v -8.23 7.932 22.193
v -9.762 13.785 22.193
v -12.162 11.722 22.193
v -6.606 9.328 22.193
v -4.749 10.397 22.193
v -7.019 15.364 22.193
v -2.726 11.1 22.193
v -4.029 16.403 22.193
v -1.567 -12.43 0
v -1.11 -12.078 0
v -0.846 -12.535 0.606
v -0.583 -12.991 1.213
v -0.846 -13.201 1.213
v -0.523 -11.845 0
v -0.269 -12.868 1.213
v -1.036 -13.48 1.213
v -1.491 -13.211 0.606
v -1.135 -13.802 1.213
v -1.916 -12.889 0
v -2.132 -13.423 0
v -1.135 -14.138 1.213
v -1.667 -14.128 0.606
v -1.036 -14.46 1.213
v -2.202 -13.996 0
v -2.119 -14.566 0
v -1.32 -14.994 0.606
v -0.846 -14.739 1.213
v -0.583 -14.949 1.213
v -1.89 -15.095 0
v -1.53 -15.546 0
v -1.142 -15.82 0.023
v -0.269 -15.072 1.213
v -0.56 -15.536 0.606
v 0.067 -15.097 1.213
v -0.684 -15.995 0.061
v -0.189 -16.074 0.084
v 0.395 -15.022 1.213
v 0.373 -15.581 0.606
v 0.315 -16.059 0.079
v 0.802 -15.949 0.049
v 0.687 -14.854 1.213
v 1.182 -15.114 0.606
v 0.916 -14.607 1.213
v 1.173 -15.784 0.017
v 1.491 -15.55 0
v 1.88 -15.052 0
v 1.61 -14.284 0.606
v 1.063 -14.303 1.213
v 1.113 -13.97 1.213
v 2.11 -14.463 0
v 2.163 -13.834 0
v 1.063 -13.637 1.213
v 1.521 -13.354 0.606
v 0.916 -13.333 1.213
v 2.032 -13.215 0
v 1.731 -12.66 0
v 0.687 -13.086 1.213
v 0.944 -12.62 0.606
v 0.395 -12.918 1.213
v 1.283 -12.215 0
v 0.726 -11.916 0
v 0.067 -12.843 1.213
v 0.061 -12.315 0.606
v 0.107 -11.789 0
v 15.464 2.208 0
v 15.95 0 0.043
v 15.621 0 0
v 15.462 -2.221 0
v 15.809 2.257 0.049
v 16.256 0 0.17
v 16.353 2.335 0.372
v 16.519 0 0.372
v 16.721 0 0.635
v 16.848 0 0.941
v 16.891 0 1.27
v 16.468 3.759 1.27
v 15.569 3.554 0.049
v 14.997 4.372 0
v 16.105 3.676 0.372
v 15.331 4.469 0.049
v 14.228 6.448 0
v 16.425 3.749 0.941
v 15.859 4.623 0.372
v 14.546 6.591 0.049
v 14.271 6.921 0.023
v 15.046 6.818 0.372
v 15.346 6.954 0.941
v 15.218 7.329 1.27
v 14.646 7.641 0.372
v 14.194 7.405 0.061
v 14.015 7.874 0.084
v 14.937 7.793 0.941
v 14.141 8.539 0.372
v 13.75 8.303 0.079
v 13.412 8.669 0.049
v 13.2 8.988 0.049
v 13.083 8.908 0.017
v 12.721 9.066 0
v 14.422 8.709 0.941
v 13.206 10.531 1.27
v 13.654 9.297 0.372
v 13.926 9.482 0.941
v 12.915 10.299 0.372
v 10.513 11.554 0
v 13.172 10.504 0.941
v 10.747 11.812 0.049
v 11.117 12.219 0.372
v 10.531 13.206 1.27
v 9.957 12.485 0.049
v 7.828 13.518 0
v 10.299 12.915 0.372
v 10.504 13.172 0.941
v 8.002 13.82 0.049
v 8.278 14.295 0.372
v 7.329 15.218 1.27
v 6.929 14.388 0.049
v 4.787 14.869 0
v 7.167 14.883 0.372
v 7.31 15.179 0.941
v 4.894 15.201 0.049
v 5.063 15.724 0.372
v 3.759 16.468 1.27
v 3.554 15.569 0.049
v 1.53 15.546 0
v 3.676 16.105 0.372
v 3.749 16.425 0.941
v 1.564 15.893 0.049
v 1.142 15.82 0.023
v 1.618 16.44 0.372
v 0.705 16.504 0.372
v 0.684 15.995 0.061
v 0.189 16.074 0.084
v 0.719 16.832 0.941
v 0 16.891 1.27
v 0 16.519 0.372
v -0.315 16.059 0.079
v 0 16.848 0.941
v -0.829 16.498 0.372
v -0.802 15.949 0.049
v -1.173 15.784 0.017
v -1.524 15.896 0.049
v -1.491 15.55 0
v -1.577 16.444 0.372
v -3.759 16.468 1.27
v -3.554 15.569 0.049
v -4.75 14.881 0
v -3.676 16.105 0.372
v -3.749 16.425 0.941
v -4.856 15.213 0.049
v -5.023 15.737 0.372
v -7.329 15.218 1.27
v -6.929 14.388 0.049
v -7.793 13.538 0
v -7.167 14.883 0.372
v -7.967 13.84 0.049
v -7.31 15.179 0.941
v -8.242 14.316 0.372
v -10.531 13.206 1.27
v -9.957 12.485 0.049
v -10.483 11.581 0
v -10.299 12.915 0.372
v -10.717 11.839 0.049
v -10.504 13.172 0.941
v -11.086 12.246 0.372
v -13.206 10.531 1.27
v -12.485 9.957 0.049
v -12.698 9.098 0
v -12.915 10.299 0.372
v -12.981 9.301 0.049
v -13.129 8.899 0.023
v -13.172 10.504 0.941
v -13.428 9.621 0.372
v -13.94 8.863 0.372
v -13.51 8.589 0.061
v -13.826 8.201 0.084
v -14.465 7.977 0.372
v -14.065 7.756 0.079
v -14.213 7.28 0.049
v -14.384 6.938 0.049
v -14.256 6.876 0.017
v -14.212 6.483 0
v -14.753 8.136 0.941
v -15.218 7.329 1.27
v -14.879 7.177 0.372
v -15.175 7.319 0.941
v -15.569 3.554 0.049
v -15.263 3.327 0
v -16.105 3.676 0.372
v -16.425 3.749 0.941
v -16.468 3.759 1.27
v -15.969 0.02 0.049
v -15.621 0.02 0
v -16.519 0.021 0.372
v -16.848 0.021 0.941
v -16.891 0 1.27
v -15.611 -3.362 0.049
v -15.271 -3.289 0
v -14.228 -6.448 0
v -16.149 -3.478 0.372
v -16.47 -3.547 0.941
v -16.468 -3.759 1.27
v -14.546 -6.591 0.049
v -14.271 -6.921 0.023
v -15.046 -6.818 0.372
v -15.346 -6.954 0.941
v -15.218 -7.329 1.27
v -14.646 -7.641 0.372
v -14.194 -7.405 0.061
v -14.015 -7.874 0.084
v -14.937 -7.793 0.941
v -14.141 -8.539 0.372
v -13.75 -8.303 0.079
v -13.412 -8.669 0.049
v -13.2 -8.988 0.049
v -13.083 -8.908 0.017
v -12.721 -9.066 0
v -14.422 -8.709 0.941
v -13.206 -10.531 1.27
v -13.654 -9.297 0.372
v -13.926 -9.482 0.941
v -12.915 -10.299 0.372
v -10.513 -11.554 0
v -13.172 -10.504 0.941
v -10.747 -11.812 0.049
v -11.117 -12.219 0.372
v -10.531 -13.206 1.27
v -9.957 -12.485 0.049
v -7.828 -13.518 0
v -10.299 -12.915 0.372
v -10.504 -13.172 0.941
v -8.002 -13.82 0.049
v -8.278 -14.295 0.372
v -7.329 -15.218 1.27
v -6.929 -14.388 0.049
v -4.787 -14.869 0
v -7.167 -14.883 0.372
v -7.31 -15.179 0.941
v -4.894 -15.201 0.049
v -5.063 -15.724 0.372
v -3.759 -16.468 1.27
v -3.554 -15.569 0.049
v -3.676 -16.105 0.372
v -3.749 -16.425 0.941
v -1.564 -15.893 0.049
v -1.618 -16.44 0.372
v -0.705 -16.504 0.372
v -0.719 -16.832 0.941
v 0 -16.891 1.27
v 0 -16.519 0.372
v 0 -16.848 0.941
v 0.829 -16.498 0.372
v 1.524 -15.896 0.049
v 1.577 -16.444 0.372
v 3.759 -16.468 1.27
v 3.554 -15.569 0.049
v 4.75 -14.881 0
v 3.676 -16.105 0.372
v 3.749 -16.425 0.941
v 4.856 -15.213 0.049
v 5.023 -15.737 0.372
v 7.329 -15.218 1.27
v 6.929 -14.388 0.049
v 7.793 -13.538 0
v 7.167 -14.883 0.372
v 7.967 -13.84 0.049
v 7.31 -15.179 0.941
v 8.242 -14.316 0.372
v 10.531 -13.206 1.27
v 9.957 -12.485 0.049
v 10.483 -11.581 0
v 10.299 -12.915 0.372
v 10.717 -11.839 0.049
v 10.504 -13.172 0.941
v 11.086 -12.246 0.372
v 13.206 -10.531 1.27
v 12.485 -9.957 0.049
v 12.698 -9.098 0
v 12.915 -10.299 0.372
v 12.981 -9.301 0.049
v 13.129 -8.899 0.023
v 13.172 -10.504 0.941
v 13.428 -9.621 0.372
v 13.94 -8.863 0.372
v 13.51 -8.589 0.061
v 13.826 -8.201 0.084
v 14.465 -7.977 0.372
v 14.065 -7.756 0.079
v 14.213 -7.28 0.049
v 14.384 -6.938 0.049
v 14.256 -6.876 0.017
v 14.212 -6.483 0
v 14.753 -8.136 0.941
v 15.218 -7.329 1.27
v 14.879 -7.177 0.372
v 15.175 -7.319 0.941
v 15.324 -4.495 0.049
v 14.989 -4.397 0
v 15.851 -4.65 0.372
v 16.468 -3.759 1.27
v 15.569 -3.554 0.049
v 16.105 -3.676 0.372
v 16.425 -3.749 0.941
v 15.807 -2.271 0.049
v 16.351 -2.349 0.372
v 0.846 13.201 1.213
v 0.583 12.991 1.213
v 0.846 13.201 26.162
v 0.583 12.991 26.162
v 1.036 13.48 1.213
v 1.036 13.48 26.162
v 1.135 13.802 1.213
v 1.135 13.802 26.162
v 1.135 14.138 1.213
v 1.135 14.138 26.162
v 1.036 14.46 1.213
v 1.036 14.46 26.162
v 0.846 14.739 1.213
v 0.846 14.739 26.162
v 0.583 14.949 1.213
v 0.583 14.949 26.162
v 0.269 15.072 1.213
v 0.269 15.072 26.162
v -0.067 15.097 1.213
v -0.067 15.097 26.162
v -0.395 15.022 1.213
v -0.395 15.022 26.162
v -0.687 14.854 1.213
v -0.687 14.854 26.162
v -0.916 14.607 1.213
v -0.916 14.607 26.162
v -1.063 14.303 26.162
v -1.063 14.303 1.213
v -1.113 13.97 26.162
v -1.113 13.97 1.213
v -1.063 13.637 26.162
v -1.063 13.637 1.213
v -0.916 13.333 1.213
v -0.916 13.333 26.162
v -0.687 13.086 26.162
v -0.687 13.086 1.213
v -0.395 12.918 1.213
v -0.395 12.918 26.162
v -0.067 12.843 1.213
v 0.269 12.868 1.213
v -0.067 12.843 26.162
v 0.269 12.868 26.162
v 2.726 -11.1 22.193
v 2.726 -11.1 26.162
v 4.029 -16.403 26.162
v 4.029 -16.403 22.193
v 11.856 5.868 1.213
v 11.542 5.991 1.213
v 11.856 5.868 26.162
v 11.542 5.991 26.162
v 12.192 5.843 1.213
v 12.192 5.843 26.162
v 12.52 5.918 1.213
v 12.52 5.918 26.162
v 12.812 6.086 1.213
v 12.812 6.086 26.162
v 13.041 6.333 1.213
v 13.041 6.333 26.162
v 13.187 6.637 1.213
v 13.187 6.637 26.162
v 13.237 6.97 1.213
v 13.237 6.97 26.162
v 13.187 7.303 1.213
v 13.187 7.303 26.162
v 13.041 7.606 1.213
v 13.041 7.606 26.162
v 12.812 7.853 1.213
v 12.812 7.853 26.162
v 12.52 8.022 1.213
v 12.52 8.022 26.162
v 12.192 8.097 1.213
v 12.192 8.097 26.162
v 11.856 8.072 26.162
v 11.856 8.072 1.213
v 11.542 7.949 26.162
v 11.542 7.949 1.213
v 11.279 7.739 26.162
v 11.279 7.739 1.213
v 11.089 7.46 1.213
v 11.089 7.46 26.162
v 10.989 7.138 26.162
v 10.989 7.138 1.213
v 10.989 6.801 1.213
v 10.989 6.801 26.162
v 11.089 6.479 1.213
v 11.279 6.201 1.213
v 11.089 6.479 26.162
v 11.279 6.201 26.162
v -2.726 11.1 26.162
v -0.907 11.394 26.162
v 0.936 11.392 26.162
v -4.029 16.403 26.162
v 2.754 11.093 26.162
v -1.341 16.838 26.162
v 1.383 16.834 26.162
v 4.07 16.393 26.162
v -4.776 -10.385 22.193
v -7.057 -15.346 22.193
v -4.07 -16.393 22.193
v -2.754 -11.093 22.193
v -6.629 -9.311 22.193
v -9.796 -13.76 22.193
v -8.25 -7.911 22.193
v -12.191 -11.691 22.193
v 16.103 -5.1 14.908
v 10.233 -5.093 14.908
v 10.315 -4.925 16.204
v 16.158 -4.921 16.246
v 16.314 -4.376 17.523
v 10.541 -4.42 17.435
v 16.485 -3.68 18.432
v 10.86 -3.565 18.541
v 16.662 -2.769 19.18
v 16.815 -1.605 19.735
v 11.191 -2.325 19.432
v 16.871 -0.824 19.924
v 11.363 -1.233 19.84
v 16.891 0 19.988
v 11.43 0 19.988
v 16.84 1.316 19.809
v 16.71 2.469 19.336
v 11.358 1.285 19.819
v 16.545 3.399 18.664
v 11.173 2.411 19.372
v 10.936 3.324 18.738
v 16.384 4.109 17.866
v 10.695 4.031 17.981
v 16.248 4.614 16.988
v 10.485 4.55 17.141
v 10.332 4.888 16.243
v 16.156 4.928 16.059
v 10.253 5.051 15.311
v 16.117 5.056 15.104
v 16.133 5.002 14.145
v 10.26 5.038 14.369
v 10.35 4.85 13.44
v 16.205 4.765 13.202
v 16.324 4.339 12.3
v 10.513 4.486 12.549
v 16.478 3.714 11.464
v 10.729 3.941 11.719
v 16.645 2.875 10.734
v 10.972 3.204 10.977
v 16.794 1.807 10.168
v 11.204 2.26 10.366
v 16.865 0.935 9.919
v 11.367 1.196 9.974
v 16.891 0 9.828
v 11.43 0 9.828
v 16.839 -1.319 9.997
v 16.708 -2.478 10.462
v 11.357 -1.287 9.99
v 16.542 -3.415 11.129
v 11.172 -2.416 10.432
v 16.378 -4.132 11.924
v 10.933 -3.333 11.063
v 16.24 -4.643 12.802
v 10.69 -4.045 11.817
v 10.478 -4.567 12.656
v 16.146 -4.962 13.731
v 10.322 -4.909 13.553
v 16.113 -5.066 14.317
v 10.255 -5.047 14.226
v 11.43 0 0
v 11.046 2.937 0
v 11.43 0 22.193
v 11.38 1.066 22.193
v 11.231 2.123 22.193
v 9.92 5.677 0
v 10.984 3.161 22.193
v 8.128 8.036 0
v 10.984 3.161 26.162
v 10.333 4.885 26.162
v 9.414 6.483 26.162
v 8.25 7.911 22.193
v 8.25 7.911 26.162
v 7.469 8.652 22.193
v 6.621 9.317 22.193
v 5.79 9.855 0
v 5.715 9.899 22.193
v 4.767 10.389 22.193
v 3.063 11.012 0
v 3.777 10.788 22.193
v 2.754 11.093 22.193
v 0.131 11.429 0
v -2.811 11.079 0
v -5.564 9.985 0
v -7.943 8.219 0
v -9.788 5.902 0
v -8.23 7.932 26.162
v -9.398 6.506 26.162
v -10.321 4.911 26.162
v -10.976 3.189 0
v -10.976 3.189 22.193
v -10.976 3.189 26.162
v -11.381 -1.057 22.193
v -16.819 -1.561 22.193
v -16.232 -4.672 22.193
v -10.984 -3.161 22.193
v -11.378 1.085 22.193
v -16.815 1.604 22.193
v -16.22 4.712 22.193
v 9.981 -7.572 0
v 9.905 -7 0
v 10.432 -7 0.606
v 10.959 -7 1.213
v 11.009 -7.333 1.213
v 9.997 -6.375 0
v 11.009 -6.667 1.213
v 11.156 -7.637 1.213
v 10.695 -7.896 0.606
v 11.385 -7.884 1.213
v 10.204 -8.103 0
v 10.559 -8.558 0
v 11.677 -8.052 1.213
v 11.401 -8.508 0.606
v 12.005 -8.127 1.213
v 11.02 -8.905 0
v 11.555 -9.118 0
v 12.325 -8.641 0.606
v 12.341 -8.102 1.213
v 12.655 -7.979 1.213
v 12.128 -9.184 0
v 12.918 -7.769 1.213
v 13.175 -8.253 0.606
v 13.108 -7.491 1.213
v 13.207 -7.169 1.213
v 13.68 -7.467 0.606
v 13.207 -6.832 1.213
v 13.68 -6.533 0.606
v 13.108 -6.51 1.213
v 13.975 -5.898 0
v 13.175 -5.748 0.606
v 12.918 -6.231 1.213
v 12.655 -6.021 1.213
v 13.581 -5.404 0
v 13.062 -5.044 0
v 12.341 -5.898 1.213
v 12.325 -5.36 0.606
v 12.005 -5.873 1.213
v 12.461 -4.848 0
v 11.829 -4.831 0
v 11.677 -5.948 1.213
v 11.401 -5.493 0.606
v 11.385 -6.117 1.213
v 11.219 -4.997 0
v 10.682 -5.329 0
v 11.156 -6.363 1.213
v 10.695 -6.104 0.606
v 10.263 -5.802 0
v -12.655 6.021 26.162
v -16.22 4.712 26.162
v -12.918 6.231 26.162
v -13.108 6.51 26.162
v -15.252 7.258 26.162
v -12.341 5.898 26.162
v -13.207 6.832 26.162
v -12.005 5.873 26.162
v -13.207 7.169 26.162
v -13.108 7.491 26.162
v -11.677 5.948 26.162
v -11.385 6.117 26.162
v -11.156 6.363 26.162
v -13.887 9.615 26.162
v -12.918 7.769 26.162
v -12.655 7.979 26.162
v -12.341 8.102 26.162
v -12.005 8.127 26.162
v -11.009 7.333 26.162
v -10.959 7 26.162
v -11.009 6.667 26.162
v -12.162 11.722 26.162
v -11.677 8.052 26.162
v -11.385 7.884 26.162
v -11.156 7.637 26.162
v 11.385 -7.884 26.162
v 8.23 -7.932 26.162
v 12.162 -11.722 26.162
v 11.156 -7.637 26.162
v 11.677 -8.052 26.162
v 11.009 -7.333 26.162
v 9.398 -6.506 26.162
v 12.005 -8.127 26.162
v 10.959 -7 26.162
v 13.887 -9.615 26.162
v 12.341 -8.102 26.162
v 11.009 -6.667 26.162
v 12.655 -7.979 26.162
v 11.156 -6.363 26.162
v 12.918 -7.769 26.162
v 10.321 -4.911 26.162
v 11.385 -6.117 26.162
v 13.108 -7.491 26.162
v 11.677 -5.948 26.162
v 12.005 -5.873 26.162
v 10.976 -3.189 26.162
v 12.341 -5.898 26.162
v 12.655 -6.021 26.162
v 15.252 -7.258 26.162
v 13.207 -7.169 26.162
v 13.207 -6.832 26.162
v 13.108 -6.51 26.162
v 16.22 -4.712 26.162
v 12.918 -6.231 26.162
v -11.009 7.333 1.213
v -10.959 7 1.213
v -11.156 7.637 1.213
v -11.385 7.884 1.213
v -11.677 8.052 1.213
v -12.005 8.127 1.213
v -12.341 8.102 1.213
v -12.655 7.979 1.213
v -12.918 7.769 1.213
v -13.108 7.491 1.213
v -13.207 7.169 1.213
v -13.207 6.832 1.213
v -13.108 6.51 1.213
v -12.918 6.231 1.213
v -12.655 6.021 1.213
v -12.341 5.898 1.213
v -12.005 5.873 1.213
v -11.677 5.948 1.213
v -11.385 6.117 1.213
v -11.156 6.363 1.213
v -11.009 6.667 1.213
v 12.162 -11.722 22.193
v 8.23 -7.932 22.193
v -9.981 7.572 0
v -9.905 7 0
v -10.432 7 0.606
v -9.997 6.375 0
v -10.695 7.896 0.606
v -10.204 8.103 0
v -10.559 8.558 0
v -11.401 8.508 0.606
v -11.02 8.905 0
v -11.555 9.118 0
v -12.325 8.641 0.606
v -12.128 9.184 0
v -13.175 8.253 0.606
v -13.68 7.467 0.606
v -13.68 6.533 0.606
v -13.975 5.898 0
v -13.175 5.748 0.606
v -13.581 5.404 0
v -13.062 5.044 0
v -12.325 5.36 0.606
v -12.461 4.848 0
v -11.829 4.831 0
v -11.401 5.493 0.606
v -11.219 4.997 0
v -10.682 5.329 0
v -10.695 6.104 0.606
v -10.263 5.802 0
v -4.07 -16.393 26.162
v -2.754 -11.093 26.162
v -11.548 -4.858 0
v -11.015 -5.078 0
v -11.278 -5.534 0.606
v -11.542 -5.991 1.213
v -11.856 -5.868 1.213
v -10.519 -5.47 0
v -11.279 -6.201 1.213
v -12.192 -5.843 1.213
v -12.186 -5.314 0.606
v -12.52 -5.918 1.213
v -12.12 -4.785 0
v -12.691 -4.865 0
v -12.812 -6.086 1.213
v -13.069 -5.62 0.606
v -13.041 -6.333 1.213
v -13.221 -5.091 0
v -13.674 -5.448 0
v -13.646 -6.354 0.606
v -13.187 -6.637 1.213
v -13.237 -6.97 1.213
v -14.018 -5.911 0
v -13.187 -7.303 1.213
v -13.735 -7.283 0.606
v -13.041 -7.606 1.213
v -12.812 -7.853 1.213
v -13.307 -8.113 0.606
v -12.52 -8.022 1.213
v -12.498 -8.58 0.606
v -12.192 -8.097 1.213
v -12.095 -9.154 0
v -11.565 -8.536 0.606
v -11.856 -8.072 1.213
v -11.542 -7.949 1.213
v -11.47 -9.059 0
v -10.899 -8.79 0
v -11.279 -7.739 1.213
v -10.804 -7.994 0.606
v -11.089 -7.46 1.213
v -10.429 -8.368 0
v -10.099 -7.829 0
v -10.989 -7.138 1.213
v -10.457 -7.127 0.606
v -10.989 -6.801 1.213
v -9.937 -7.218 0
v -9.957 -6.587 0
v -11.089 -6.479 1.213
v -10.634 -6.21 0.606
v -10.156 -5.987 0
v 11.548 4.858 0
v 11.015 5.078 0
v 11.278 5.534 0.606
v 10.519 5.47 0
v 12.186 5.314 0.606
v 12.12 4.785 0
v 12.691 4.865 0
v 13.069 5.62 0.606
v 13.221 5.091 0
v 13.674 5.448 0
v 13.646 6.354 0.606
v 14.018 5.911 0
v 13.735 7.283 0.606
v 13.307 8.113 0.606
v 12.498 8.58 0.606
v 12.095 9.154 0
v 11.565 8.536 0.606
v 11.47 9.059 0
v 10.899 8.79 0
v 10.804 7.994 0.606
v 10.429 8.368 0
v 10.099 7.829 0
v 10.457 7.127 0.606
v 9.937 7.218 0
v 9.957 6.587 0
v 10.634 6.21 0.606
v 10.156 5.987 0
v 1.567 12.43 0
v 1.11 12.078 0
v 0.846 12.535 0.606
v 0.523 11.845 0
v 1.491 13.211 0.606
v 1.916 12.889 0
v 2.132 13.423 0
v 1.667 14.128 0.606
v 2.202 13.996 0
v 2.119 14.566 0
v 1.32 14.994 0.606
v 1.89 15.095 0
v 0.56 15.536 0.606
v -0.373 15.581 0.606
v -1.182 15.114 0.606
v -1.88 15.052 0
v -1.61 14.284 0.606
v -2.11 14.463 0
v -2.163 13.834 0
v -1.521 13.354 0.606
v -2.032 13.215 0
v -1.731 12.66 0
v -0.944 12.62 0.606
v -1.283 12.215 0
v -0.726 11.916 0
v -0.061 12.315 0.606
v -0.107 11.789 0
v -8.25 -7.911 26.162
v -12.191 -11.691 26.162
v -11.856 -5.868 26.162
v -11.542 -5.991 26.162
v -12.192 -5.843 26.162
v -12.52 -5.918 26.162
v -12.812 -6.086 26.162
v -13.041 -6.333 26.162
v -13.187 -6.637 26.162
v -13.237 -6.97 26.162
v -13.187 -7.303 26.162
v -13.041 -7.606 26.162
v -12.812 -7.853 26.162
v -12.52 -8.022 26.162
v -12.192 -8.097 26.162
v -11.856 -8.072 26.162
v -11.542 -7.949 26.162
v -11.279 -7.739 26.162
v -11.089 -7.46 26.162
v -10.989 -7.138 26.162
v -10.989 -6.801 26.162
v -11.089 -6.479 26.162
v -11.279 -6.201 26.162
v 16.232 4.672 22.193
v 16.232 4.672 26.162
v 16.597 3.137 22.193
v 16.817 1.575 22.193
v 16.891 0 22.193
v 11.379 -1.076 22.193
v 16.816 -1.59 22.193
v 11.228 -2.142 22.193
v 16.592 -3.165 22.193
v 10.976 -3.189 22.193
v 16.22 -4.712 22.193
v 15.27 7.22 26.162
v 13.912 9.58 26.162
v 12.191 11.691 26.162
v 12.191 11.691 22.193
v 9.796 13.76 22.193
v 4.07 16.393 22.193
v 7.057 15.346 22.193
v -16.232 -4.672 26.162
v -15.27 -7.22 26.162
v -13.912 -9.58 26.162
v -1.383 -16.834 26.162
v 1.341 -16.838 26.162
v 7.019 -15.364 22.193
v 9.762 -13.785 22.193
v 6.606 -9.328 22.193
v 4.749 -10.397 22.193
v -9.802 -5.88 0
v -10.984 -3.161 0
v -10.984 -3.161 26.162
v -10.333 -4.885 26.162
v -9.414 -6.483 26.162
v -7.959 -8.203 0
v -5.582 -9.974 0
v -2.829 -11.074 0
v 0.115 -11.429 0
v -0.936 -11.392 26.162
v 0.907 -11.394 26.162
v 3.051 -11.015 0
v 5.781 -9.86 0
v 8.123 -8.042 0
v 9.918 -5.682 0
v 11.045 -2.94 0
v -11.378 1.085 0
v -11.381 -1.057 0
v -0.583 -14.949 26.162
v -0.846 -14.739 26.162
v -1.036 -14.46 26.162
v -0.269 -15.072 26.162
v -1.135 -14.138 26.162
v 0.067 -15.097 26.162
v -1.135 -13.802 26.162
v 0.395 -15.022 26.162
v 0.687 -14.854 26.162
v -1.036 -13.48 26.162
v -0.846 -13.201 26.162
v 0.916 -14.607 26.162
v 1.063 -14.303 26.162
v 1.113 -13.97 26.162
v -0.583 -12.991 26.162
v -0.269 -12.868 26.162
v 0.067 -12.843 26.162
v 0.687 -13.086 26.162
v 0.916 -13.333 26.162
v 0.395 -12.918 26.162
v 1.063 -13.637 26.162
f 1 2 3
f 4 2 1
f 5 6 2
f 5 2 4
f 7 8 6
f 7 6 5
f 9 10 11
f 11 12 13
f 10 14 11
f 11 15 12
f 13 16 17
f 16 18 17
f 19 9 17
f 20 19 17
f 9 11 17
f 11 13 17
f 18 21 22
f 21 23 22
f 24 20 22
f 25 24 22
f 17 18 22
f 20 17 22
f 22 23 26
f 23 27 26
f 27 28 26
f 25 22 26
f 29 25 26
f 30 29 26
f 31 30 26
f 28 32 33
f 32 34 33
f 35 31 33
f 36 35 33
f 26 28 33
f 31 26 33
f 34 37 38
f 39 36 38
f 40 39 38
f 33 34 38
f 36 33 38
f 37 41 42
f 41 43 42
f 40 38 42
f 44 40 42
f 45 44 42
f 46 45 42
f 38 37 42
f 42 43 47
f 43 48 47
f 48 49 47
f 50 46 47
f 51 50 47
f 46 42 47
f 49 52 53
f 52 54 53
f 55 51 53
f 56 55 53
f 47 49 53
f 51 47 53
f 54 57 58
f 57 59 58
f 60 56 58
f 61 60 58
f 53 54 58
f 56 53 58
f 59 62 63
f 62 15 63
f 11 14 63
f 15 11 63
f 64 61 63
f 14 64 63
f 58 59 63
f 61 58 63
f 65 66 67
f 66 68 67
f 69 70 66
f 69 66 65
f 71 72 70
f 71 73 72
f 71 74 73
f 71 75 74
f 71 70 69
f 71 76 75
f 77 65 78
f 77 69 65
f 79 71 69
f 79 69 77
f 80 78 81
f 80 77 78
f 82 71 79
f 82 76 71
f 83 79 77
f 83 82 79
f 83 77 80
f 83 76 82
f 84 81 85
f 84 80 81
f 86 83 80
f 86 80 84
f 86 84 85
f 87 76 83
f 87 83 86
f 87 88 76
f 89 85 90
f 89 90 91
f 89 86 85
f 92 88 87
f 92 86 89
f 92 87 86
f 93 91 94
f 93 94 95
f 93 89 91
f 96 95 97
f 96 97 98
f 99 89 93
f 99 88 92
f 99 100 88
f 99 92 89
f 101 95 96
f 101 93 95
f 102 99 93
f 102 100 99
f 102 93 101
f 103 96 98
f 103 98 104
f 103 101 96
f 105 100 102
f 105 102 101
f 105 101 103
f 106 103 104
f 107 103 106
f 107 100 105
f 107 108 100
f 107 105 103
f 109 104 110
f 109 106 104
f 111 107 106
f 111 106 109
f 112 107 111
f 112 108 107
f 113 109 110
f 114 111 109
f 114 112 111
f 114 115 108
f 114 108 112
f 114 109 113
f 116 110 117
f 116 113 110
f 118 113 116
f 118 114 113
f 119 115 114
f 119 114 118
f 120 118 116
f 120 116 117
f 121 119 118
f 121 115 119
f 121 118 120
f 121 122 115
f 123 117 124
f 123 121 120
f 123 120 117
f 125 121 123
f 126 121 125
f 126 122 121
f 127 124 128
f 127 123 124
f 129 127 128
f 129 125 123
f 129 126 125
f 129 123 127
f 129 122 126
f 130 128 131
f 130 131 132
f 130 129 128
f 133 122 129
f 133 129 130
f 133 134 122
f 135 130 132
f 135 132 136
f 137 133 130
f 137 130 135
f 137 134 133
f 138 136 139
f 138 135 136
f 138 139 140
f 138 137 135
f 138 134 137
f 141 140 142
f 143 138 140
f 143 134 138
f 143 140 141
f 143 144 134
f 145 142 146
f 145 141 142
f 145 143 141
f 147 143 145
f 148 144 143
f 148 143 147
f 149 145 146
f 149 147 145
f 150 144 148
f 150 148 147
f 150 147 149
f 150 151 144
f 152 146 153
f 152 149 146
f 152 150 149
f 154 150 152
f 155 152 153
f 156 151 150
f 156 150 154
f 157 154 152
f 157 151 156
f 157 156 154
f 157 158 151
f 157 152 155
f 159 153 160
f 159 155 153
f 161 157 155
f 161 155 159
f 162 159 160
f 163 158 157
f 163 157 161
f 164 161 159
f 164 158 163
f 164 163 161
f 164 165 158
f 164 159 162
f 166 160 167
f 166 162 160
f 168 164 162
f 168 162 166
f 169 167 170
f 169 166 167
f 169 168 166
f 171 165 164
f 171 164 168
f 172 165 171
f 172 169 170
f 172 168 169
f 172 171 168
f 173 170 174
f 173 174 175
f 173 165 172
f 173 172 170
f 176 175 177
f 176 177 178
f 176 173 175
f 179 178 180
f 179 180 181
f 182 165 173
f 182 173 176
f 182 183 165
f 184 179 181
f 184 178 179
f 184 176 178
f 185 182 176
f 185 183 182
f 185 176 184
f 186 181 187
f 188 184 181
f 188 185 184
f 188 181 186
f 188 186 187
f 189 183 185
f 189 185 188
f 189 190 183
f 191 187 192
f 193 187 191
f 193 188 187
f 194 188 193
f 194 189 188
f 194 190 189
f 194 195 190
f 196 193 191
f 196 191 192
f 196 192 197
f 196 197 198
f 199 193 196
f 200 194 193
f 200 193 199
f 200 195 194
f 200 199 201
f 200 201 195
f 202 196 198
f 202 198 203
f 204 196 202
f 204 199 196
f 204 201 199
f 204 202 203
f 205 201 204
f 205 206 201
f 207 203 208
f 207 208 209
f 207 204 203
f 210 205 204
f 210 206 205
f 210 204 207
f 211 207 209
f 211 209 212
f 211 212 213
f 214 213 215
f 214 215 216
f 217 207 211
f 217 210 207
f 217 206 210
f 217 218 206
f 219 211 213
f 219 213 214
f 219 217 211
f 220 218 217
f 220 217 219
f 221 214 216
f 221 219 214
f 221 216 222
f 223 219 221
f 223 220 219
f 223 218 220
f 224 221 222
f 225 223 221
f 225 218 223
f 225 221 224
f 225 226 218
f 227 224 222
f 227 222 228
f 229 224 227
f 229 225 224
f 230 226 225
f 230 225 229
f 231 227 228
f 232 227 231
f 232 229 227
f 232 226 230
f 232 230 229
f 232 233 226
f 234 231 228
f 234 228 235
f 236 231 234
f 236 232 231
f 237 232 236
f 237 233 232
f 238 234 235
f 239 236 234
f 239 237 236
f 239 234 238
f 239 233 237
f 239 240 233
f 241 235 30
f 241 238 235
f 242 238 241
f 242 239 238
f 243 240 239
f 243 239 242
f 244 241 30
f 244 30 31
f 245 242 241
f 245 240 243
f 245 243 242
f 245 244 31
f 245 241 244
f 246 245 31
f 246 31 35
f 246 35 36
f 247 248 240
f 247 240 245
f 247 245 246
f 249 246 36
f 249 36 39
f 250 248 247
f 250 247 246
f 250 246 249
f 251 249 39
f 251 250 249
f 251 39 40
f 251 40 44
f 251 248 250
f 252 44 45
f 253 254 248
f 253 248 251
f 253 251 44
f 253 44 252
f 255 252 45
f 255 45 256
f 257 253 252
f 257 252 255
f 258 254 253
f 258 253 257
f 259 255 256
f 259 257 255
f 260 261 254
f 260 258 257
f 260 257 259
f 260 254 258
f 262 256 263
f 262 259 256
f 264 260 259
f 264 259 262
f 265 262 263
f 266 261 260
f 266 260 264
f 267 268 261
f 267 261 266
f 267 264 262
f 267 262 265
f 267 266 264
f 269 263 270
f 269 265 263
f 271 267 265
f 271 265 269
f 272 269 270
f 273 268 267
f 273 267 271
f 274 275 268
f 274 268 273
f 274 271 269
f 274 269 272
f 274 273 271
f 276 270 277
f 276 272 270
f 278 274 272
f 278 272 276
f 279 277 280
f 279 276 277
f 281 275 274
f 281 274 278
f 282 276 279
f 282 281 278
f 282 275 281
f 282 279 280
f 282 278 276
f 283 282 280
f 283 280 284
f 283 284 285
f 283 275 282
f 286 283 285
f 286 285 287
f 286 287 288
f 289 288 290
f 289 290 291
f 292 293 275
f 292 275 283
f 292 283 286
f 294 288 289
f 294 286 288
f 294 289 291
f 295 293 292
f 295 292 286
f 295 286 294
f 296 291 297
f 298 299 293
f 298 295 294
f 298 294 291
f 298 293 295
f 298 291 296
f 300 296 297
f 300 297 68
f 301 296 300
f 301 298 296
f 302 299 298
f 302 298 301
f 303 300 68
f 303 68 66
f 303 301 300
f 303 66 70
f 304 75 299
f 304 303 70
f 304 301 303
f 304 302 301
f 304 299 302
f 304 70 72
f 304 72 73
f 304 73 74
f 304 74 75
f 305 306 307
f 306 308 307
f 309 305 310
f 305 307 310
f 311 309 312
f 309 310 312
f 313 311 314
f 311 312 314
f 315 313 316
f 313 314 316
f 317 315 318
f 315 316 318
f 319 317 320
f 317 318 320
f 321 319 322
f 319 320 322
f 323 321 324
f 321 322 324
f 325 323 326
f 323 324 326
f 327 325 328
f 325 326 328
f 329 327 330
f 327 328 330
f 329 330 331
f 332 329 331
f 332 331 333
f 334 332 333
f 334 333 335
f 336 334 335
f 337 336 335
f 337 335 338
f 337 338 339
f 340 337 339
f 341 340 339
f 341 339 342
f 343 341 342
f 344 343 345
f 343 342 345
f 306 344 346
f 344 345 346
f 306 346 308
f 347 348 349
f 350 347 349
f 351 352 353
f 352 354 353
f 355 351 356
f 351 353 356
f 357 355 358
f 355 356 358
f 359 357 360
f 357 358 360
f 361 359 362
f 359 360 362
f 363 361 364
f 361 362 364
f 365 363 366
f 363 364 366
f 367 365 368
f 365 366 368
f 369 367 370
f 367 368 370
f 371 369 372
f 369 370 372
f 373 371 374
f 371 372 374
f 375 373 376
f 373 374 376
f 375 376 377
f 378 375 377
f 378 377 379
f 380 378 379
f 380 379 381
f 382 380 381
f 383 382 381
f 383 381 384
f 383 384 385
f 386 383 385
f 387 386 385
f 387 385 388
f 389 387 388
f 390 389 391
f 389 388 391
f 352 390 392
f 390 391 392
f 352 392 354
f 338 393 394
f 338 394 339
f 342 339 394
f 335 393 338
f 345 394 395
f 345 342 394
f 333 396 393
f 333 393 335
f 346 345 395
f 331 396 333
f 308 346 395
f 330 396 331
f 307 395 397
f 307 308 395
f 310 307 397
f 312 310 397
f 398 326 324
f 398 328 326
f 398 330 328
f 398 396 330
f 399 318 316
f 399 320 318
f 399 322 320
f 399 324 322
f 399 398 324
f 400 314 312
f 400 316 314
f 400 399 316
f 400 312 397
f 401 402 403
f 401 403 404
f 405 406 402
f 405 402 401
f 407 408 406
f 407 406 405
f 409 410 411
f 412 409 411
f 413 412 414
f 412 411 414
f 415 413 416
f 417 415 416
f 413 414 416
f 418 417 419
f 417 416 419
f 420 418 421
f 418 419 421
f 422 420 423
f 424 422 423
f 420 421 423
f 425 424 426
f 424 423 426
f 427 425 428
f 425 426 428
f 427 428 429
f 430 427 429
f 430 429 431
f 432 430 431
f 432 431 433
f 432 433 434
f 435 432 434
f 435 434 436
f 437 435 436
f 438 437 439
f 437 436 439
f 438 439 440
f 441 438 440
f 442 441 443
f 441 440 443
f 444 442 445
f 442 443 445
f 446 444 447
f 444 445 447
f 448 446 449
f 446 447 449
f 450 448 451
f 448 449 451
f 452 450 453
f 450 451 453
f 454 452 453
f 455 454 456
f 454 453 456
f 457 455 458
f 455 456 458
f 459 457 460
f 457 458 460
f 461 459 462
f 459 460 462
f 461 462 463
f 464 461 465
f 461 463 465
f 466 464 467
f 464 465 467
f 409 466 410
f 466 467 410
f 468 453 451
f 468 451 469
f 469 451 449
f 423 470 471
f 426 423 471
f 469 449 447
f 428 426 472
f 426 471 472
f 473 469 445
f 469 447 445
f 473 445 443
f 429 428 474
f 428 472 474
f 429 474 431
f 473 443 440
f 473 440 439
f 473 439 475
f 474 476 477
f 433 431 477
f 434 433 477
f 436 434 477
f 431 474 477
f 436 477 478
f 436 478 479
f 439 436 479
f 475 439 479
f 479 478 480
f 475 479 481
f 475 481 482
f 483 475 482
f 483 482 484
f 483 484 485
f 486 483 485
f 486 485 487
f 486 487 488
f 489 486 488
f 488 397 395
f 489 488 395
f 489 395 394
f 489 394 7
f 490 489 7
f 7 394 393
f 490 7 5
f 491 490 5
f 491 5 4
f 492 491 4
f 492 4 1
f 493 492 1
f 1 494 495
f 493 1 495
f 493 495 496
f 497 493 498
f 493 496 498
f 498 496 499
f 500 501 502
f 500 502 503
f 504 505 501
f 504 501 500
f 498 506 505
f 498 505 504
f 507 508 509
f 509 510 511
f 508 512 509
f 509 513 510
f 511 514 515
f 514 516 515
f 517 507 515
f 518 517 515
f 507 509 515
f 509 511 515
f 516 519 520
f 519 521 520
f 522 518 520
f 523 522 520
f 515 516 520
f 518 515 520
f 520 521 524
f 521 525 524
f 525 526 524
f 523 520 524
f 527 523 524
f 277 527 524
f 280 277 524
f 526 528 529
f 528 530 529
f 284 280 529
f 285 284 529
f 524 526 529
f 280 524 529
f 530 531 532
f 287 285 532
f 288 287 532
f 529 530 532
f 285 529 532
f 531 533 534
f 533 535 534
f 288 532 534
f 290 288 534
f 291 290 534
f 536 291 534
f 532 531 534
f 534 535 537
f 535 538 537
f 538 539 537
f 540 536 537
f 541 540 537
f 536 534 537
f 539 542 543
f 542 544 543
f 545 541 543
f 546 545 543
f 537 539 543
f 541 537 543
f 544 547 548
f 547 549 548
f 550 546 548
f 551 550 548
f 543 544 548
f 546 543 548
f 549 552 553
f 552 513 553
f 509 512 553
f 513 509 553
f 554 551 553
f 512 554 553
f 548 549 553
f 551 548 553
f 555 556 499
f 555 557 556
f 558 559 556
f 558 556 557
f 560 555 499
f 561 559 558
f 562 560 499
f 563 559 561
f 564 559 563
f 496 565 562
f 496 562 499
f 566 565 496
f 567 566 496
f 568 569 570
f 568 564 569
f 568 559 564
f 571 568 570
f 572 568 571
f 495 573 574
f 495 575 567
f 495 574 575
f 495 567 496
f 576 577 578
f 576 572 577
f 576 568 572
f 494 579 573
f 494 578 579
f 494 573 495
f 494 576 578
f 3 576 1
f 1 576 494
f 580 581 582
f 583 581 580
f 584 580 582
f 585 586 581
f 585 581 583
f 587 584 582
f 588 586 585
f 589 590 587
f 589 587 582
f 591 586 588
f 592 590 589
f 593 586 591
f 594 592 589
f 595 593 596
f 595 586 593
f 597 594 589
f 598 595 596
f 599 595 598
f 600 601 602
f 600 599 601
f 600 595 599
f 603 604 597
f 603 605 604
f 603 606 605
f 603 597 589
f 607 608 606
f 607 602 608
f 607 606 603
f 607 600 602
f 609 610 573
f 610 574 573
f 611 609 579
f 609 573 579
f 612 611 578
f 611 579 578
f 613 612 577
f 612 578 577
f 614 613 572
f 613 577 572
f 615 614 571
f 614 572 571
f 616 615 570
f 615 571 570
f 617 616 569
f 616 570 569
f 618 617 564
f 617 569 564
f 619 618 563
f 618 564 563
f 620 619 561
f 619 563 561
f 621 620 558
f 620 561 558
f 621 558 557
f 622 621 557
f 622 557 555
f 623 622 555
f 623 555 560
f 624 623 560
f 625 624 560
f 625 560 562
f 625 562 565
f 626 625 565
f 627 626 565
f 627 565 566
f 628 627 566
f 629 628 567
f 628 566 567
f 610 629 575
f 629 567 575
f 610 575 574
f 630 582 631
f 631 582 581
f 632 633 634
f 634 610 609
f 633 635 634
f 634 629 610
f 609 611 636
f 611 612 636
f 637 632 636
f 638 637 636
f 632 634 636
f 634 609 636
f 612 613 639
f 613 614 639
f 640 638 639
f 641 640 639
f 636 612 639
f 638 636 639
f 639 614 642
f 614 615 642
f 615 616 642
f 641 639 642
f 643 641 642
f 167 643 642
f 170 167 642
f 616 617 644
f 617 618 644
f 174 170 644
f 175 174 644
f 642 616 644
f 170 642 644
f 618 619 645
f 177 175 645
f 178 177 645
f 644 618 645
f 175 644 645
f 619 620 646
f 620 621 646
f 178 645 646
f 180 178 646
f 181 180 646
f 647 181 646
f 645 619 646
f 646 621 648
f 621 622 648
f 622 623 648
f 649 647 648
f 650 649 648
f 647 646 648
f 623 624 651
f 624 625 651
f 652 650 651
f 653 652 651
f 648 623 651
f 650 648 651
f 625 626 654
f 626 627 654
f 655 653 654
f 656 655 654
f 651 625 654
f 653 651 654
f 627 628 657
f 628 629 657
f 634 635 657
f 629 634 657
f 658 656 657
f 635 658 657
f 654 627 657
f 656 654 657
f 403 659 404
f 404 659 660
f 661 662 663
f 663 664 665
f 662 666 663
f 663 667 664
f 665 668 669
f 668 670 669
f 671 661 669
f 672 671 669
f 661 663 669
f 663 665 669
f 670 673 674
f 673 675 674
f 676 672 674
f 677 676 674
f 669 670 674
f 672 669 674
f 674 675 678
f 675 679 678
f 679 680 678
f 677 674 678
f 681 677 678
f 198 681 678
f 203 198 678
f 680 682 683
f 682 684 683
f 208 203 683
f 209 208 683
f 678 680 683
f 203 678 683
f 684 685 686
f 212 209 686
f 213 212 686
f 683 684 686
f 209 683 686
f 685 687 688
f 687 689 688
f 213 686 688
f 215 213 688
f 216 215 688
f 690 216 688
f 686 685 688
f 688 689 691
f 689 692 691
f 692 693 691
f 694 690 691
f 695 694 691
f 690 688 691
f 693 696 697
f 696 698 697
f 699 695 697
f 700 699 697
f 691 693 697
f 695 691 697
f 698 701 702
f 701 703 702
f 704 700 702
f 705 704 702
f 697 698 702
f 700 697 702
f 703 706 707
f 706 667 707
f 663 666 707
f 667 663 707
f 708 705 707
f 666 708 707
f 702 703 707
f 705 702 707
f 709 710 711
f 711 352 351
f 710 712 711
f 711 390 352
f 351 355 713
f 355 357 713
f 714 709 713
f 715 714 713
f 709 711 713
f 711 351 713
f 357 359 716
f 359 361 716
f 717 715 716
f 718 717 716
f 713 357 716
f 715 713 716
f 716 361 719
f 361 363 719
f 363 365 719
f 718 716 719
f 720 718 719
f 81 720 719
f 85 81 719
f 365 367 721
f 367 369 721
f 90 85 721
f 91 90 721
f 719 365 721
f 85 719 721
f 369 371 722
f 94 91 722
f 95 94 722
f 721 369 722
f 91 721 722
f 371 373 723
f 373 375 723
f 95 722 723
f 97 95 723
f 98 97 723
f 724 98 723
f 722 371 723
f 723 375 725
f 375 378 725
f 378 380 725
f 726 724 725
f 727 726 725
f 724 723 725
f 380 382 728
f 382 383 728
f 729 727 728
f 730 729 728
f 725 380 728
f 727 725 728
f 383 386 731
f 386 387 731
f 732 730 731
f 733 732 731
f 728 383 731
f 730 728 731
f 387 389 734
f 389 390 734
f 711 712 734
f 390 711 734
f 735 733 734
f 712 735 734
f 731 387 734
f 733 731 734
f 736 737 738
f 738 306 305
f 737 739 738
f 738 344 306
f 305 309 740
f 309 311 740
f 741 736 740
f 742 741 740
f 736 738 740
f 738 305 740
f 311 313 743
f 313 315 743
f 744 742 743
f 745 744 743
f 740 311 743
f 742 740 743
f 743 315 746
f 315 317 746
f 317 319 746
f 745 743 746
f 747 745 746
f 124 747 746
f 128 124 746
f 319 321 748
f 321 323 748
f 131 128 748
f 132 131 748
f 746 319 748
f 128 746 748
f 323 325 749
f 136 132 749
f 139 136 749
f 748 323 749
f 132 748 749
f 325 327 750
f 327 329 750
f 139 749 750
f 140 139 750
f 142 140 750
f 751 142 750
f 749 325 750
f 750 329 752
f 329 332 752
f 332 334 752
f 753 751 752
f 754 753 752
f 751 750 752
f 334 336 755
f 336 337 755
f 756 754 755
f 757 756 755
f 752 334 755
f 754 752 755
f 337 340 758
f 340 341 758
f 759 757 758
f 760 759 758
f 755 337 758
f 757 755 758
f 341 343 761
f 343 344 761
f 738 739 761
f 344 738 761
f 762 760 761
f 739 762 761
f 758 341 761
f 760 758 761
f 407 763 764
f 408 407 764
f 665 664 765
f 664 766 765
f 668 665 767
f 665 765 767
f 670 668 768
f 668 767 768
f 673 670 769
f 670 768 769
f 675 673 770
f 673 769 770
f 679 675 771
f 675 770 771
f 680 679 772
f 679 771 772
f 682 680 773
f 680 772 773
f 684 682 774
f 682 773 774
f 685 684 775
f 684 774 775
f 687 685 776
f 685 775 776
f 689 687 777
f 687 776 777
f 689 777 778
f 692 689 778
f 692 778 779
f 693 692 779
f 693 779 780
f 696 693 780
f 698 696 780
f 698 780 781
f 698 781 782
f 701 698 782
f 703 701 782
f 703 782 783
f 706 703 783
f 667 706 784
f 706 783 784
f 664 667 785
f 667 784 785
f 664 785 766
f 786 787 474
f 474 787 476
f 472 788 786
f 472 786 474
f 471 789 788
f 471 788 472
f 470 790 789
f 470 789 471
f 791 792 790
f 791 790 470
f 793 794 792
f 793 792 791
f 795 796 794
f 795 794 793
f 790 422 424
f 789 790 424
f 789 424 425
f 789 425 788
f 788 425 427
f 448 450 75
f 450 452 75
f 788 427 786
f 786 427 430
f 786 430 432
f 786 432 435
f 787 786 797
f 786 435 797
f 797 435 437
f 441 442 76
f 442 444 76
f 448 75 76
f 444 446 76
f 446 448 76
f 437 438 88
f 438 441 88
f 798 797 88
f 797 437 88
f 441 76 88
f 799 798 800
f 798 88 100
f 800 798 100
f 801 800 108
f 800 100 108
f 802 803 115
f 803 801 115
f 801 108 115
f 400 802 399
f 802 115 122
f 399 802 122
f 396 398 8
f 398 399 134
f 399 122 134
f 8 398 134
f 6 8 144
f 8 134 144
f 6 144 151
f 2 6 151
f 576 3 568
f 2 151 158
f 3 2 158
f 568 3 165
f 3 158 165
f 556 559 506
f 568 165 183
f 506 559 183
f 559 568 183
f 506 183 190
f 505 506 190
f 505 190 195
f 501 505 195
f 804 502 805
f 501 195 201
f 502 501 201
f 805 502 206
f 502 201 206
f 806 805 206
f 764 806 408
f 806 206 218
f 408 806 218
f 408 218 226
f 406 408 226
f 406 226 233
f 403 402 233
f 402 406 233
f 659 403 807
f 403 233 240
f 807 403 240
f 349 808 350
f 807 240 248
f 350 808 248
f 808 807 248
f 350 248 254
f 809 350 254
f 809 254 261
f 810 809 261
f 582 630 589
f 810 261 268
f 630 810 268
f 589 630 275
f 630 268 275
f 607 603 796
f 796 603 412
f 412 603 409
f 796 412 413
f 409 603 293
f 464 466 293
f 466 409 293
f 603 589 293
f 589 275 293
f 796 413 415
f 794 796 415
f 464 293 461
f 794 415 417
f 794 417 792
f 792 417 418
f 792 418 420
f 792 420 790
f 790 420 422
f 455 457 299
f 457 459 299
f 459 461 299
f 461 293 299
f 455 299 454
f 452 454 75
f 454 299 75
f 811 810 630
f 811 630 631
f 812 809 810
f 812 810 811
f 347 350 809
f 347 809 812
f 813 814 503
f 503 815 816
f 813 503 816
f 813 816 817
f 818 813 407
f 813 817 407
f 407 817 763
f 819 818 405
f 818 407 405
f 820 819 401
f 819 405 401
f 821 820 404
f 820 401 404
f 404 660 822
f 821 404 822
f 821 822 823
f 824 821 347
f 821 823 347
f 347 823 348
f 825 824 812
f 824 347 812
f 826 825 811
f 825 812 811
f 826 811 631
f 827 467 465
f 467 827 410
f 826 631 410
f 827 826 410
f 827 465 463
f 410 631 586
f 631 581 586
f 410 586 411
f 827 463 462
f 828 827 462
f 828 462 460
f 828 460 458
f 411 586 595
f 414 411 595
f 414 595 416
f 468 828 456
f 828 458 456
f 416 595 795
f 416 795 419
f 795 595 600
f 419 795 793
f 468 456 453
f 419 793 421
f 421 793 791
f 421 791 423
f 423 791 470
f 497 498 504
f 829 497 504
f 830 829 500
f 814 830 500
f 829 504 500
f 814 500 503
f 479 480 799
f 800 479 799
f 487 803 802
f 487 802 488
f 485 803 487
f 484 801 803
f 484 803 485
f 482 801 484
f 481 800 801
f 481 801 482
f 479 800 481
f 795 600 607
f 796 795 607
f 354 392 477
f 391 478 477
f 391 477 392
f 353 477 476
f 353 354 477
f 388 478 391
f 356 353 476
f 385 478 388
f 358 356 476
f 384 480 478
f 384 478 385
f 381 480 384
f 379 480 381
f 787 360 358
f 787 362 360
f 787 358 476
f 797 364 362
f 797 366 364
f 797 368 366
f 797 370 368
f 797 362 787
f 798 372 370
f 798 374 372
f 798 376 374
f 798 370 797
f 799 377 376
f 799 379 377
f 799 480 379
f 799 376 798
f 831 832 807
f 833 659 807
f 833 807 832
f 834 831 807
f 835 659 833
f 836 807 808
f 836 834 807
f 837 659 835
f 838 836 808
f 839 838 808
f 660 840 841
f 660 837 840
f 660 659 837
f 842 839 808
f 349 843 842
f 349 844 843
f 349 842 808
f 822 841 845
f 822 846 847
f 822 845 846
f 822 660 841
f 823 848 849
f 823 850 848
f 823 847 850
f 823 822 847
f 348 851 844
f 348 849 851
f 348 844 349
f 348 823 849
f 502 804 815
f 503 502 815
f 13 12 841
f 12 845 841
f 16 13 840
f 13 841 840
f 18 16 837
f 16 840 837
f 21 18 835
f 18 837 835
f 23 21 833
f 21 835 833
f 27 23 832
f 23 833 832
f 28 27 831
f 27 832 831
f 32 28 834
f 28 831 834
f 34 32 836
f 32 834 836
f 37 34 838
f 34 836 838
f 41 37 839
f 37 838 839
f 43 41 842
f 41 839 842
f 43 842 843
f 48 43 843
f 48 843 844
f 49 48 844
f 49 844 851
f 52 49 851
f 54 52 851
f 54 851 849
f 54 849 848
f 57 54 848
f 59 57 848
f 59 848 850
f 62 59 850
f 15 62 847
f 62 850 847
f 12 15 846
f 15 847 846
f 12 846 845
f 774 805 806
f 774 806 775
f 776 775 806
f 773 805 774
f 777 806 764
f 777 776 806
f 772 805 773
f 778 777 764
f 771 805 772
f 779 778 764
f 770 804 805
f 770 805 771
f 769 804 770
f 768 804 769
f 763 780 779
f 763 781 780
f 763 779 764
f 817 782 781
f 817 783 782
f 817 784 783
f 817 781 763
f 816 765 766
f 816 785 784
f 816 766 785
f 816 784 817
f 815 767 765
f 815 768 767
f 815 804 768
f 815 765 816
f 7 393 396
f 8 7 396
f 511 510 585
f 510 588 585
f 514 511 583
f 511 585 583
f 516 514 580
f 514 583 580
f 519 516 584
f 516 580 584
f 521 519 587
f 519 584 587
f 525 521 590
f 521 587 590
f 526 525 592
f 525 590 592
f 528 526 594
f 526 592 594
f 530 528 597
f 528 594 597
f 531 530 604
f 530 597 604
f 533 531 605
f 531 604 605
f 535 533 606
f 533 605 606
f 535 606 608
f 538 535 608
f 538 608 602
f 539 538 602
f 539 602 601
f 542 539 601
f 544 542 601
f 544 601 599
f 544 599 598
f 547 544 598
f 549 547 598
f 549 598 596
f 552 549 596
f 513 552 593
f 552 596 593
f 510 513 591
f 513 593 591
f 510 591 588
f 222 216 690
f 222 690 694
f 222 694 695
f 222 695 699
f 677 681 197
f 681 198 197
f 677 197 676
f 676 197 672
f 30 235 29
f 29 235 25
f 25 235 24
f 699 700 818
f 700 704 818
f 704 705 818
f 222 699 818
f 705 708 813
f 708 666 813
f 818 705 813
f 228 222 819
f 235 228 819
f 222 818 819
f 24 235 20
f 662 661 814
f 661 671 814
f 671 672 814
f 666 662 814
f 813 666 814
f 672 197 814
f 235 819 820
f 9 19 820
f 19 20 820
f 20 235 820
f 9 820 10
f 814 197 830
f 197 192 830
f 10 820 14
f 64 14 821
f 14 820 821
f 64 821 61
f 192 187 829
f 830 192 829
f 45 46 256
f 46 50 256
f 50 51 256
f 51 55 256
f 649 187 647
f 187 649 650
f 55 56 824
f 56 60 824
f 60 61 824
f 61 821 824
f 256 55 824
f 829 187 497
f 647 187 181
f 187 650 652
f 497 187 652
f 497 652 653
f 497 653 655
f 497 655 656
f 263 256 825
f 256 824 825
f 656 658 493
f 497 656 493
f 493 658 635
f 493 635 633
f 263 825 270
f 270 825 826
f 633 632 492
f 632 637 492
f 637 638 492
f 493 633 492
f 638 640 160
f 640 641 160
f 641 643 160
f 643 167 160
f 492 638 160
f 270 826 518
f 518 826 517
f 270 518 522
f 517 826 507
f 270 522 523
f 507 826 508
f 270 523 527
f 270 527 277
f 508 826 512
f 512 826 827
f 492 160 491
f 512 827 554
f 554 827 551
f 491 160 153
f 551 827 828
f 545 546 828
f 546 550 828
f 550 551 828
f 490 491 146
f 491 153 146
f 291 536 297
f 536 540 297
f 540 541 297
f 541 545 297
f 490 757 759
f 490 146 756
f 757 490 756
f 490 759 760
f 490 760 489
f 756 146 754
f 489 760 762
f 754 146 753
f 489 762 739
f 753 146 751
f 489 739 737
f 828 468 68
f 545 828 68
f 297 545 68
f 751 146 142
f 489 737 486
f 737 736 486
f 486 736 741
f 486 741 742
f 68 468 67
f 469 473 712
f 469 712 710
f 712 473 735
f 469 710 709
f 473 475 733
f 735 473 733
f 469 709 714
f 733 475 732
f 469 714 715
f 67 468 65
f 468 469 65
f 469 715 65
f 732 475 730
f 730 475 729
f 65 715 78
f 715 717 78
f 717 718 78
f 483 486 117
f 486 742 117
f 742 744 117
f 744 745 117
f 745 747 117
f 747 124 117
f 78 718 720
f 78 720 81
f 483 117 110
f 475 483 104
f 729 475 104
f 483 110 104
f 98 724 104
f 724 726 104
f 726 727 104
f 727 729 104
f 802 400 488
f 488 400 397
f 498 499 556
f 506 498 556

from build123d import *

# Parameters (mm, degrees)
SKETCH1_R                                      = 16.891
BOSS_EXTRUDE1_DEPTH                            = 26.162
SKETCH9_R                                      = 9.525
CUT_EXTRUDE6_DEPTH                             = 36.426854306
SKETCH10_R                                     = 11.43
BOSS_EXTRUDE2_DEPTH                            = 19.05
SKETCH11_R                                     = 9.525
CUT_EXTRUDE7_DEPTH                             = 36.426854306
CUT_EXTRUDE8_DEPTH                             = 3.96875
CSK_FOR_2_FLAT_HEAD_MACHINE_SCREW1_D           = 2.2606
CSK_FOR_2_FLAT_HEAD_MACHINE_SCREW1_CSINK_D     = 4.3688
CSK_FOR_2_FLAT_HEAD_MACHINE_SCREW1_CSINK_ANGLE = 82
CIRPATTERN1_COUNT                              = 6
F_1_2_0_4_DIAMETER_HOLE1_D                     = 10.16
F_1_2_0_4_DIAMETER_HOLE1_DEPTH                 = 12.7
F_1_2_0_4_DIAMETER_HOLE1_TIP                   = 3.052371945
FILLET1_R                                      = 1.27


with BuildPart() as part:
    # Sketch1 → Boss-Extrude1 (new body)
    with BuildSketch(Plane.XY):
        Circle(SKETCH1_R)
    extrude(amount=BOSS_EXTRUDE1_DEPTH)

    # Sketch9 → Cut-Extrude6 (cut, through all)
    with BuildSketch(Plane(origin=(0, 0, 0), x_dir=(-1, 0, 0), z_dir=(0, 0, -1))):
        Circle(SKETCH9_R)
        with BuildLine():
            ThreePointArc((-5.359640753, -7.874), (0, -9.525), (5.359640753, -7.874))
            Line((5.359640753, -7.874), (-5.359640753, -7.874))
        make_face()
        with BuildLine():
            ThreePointArc((-7.874, 5.359640753), (-9.525, 0), (-7.874, -5.359640753))
            Line((-7.874, -5.359640753), (-7.874, 5.359640753))
        make_face()
        with BuildLine():
            Line((-5.359640753, 7.874), (5.359640753, 7.874))
            ThreePointArc((5.359640753, 7.874), (0, 9.525), (-5.359640753, 7.874))
        make_face()
        with BuildLine():
            Line((7.874, 5.359640753), (7.874, -5.359640753))
            ThreePointArc((7.874, -5.359640753), (9.102897204, -2.804084075), (9.525, 0))
            ThreePointArc((9.525, 0), (9.102897204, 2.804084075), (7.874, 5.359640753))
        make_face()
    extrude(amount=-CUT_EXTRUDE6_DEPTH, mode=Mode.SUBTRACT)

    # Sketch10 → Boss-Extrude2 (add)
    # profile 1 of 2: a face of its own
    with BuildSketch(Plane(origin=(0, 0, 0), x_dir=(-1, 0, 0), z_dir=(0, 0, -1))):
        Circle(SKETCH10_R)
        with BuildLine():
            ThreePointArc((-5.359640753, -7.874), (-4.453933477, 8.419507206), (9.525, 0))
            ThreePointArc((9.525, 0), (8.419507206, -4.453933477), (5.359640753, -7.874))
            ThreePointArc((5.359640753, -7.874), (0, -9.525), (-5.359640753, -7.874))
        make_face(mode=Mode.SUBTRACT)
    # profile 2 of 2: a face of its own
    with BuildSketch(Plane(origin=(0, 0, 0), x_dir=(-1, 0, 0), z_dir=(0, 0, -1))):
        Circle(SKETCH10_R)
        with BuildLine():
            ThreePointArc((-5.359640753, -7.874), (-4.453933477, 8.419507206), (9.525, 0))
            ThreePointArc((9.525, 0), (8.419507206, -4.453933477), (5.359640753, -7.874))
            ThreePointArc((5.359640753, -7.874), (0, -9.525), (-5.359640753, -7.874))
        make_face(mode=Mode.SUBTRACT)
    extrude(amount=-BOSS_EXTRUDE2_DEPTH)

    # Sketch11 → Cut-Extrude7 (cut, through all)
    with BuildSketch(Plane.XY.offset(26.162)):
        with BuildLine():
            Line((-9.153468369, -2.634319991), (-10.984162043, -3.161183989))
            ThreePointArc((-10.984162043, -3.161183989), (1.596234295, -11.317991698), (11.43, 0))
            ThreePointArc((11.43, 0), (1.610471515, 11.315974615), (-10.976173491, 3.188810986))
            Line((-10.976173491, 3.188810986), (-9.146811242, 2.657342489))
            ThreePointArc((-9.146811242, 2.657342489), (1.342059596, 9.429978846), (9.525, 0))
            ThreePointArc((9.525, 0), (1.330195246, -9.431659748), (-9.153468369, -2.634319991))
        make_face()
        Circle(SKETCH11_R)
        with BuildLine():
            ThreePointArc((-10.984162043, -3.161183989), (-11.297244321, 0.014212394), (-10.976173491, 3.188810986))
            Line((-10.976173491, 3.188810986), (0, 0))
            Line((0, 0), (-10.984162043, -3.161183989))
        make_face()
        with BuildLine():
            ThreePointArc((-10.976173491, 3.188810986), (-11.429990955, 0.014379395), (-10.984162043, -3.161183989))
            ThreePointArc((-10.984162043, -3.161183989), (-11.297244321, 0.014212394), (-10.976173491, 3.188810986))
        make_face()
    extrude(amount=-CUT_EXTRUDE7_DEPTH, mode=Mode.SUBTRACT)

    # Sketch11<4> → Cut-Extrude8 (cut)
    with BuildSketch(Plane.XY.offset(26.162)):
        with BuildLine():
            ThreePointArc((-10.976173491, 3.188810986), (-11.297244321, 0.014212394), (-10.984162043, -3.161183989))
            Line((-10.984162043, -3.161183989), (0, 0))
            Line((0, 0), (-10.976173491, 3.188810986))
        make_face()
        with BuildLine():
            ThreePointArc((-10.976173491, 3.188810986), (-11.429990955, 0.014379395), (-10.984162043, -3.161183989))
            ThreePointArc((-10.984162043, -3.161183989), (-11.297244321, 0.014212394), (-10.976173491, 3.188810986))
        make_face()
        with BuildLine():
            Line((-16.232150575, -4.67152745), (-10.984162043, -3.161183989))
            ThreePointArc((-10.984162043, -3.161183989), (-11.429990955, 0.014379395), (-10.976173491, 3.188810986))
            Line((-10.976173491, 3.188810986), (-16.220345269, 4.712354013))
            ThreePointArc((-16.220345269, 4.712354013), (-16.925737574, 0.021293268), (-16.232150575, -4.67152745))
        make_face()
        with BuildLine():
            Line((0, 0), (-10.984162043, -3.161183989))
            ThreePointArc((-10.984162043, -3.161183989), (1.596234295, -11.317991698), (11.43, 0))
            ThreePointArc((11.43, 0), (1.610471515, 11.315974615), (-10.976173491, 3.188810986))
            Line((-10.976173491, 3.188810986), (0, 0))
        make_face()
    cut_extrude8 = extrude(amount=-CUT_EXTRUDE8_DEPTH, mode=Mode.SUBTRACT)

    # CSK for #2 Flat Head Machine Screw1 (through all)
    with Locations(Plane(origin=(0, 0, 0), x_dir=(-1, 0, 0), z_dir=(0, 0, -1))):
        with Locations((12.089577909, 7.000214709)):
            csk_for_2_flat_head_machine_screw1 = CounterSinkHole(CSK_FOR_2_FLAT_HEAD_MACHINE_SCREW1_D / 2, CSK_FOR_2_FLAT_HEAD_MACHINE_SCREW1_CSINK_D / 2, counter_sink_angle=CSK_FOR_2_FLAT_HEAD_MACHINE_SCREW1_CSINK_ANGLE)

    # CirPattern1: Cut-Extrude8, CSK for #2 Flat Head Machine Screw1 ×6 about axis
    cirpattern1_axis = Axis((0, 0, 0), (0, 0, 1))
    add([cut_extrude8.rotate(cirpattern1_axis, i * 360 / CIRPATTERN1_COUNT) for i in range(1, CIRPATTERN1_COUNT)], mode=Mode.SUBTRACT)
    add([csk_for_2_flat_head_machine_screw1.rotate(cirpattern1_axis, i * 360 / CIRPATTERN1_COUNT) for i in range(1, CIRPATTERN1_COUNT)], mode=Mode.SUBTRACT)

    # 1/2 (0.4) Diameter Hole1
    with Locations(Plane(origin=(16.890986634, -0.02124955, 14.908061188), x_dir=(0.001258039772, 0.999999208668, 0), z_dir=(0.999999208668, -0.001258039772, 0))):
        with Locations((0, 0)):
            Hole(F_1_2_0_4_DIAMETER_HOLE1_D / 2, depth=F_1_2_0_4_DIAMETER_HOLE1_DEPTH)
            with Locations((0, 0, -(F_1_2_0_4_DIAMETER_HOLE1_DEPTH + F_1_2_0_4_DIAMETER_HOLE1_TIP / 2))):  # 118° drill point
                Cone(0, F_1_2_0_4_DIAMETER_HOLE1_D / 2, F_1_2_0_4_DIAMETER_HOLE1_TIP, mode=Mode.SUBTRACT)

    # Fillet1
    # the kernel refuses this fillet: 1.27 mm, written as the material it takes off along each edge
    with BuildSketch(Plane(origin=(0, 0, 0), x_dir=(1, 0, 0), z_dir=(0, -1, 0))) as fillet1_piece_1:
        with BuildLine():
            CenterArc((16.891 - FILLET1_R, FILLET1_R), FILLET1_R, 270, 90)
            Line((16.891 - FILLET1_R, 0), (16.891, 0))
            Line((16.891, 0), (16.891, FILLET1_R))
        make_face()
    revolve(axis=Axis((0, 0, 0), (0, 0, 1)), mode=Mode.SUBTRACT)


solid = part.part
